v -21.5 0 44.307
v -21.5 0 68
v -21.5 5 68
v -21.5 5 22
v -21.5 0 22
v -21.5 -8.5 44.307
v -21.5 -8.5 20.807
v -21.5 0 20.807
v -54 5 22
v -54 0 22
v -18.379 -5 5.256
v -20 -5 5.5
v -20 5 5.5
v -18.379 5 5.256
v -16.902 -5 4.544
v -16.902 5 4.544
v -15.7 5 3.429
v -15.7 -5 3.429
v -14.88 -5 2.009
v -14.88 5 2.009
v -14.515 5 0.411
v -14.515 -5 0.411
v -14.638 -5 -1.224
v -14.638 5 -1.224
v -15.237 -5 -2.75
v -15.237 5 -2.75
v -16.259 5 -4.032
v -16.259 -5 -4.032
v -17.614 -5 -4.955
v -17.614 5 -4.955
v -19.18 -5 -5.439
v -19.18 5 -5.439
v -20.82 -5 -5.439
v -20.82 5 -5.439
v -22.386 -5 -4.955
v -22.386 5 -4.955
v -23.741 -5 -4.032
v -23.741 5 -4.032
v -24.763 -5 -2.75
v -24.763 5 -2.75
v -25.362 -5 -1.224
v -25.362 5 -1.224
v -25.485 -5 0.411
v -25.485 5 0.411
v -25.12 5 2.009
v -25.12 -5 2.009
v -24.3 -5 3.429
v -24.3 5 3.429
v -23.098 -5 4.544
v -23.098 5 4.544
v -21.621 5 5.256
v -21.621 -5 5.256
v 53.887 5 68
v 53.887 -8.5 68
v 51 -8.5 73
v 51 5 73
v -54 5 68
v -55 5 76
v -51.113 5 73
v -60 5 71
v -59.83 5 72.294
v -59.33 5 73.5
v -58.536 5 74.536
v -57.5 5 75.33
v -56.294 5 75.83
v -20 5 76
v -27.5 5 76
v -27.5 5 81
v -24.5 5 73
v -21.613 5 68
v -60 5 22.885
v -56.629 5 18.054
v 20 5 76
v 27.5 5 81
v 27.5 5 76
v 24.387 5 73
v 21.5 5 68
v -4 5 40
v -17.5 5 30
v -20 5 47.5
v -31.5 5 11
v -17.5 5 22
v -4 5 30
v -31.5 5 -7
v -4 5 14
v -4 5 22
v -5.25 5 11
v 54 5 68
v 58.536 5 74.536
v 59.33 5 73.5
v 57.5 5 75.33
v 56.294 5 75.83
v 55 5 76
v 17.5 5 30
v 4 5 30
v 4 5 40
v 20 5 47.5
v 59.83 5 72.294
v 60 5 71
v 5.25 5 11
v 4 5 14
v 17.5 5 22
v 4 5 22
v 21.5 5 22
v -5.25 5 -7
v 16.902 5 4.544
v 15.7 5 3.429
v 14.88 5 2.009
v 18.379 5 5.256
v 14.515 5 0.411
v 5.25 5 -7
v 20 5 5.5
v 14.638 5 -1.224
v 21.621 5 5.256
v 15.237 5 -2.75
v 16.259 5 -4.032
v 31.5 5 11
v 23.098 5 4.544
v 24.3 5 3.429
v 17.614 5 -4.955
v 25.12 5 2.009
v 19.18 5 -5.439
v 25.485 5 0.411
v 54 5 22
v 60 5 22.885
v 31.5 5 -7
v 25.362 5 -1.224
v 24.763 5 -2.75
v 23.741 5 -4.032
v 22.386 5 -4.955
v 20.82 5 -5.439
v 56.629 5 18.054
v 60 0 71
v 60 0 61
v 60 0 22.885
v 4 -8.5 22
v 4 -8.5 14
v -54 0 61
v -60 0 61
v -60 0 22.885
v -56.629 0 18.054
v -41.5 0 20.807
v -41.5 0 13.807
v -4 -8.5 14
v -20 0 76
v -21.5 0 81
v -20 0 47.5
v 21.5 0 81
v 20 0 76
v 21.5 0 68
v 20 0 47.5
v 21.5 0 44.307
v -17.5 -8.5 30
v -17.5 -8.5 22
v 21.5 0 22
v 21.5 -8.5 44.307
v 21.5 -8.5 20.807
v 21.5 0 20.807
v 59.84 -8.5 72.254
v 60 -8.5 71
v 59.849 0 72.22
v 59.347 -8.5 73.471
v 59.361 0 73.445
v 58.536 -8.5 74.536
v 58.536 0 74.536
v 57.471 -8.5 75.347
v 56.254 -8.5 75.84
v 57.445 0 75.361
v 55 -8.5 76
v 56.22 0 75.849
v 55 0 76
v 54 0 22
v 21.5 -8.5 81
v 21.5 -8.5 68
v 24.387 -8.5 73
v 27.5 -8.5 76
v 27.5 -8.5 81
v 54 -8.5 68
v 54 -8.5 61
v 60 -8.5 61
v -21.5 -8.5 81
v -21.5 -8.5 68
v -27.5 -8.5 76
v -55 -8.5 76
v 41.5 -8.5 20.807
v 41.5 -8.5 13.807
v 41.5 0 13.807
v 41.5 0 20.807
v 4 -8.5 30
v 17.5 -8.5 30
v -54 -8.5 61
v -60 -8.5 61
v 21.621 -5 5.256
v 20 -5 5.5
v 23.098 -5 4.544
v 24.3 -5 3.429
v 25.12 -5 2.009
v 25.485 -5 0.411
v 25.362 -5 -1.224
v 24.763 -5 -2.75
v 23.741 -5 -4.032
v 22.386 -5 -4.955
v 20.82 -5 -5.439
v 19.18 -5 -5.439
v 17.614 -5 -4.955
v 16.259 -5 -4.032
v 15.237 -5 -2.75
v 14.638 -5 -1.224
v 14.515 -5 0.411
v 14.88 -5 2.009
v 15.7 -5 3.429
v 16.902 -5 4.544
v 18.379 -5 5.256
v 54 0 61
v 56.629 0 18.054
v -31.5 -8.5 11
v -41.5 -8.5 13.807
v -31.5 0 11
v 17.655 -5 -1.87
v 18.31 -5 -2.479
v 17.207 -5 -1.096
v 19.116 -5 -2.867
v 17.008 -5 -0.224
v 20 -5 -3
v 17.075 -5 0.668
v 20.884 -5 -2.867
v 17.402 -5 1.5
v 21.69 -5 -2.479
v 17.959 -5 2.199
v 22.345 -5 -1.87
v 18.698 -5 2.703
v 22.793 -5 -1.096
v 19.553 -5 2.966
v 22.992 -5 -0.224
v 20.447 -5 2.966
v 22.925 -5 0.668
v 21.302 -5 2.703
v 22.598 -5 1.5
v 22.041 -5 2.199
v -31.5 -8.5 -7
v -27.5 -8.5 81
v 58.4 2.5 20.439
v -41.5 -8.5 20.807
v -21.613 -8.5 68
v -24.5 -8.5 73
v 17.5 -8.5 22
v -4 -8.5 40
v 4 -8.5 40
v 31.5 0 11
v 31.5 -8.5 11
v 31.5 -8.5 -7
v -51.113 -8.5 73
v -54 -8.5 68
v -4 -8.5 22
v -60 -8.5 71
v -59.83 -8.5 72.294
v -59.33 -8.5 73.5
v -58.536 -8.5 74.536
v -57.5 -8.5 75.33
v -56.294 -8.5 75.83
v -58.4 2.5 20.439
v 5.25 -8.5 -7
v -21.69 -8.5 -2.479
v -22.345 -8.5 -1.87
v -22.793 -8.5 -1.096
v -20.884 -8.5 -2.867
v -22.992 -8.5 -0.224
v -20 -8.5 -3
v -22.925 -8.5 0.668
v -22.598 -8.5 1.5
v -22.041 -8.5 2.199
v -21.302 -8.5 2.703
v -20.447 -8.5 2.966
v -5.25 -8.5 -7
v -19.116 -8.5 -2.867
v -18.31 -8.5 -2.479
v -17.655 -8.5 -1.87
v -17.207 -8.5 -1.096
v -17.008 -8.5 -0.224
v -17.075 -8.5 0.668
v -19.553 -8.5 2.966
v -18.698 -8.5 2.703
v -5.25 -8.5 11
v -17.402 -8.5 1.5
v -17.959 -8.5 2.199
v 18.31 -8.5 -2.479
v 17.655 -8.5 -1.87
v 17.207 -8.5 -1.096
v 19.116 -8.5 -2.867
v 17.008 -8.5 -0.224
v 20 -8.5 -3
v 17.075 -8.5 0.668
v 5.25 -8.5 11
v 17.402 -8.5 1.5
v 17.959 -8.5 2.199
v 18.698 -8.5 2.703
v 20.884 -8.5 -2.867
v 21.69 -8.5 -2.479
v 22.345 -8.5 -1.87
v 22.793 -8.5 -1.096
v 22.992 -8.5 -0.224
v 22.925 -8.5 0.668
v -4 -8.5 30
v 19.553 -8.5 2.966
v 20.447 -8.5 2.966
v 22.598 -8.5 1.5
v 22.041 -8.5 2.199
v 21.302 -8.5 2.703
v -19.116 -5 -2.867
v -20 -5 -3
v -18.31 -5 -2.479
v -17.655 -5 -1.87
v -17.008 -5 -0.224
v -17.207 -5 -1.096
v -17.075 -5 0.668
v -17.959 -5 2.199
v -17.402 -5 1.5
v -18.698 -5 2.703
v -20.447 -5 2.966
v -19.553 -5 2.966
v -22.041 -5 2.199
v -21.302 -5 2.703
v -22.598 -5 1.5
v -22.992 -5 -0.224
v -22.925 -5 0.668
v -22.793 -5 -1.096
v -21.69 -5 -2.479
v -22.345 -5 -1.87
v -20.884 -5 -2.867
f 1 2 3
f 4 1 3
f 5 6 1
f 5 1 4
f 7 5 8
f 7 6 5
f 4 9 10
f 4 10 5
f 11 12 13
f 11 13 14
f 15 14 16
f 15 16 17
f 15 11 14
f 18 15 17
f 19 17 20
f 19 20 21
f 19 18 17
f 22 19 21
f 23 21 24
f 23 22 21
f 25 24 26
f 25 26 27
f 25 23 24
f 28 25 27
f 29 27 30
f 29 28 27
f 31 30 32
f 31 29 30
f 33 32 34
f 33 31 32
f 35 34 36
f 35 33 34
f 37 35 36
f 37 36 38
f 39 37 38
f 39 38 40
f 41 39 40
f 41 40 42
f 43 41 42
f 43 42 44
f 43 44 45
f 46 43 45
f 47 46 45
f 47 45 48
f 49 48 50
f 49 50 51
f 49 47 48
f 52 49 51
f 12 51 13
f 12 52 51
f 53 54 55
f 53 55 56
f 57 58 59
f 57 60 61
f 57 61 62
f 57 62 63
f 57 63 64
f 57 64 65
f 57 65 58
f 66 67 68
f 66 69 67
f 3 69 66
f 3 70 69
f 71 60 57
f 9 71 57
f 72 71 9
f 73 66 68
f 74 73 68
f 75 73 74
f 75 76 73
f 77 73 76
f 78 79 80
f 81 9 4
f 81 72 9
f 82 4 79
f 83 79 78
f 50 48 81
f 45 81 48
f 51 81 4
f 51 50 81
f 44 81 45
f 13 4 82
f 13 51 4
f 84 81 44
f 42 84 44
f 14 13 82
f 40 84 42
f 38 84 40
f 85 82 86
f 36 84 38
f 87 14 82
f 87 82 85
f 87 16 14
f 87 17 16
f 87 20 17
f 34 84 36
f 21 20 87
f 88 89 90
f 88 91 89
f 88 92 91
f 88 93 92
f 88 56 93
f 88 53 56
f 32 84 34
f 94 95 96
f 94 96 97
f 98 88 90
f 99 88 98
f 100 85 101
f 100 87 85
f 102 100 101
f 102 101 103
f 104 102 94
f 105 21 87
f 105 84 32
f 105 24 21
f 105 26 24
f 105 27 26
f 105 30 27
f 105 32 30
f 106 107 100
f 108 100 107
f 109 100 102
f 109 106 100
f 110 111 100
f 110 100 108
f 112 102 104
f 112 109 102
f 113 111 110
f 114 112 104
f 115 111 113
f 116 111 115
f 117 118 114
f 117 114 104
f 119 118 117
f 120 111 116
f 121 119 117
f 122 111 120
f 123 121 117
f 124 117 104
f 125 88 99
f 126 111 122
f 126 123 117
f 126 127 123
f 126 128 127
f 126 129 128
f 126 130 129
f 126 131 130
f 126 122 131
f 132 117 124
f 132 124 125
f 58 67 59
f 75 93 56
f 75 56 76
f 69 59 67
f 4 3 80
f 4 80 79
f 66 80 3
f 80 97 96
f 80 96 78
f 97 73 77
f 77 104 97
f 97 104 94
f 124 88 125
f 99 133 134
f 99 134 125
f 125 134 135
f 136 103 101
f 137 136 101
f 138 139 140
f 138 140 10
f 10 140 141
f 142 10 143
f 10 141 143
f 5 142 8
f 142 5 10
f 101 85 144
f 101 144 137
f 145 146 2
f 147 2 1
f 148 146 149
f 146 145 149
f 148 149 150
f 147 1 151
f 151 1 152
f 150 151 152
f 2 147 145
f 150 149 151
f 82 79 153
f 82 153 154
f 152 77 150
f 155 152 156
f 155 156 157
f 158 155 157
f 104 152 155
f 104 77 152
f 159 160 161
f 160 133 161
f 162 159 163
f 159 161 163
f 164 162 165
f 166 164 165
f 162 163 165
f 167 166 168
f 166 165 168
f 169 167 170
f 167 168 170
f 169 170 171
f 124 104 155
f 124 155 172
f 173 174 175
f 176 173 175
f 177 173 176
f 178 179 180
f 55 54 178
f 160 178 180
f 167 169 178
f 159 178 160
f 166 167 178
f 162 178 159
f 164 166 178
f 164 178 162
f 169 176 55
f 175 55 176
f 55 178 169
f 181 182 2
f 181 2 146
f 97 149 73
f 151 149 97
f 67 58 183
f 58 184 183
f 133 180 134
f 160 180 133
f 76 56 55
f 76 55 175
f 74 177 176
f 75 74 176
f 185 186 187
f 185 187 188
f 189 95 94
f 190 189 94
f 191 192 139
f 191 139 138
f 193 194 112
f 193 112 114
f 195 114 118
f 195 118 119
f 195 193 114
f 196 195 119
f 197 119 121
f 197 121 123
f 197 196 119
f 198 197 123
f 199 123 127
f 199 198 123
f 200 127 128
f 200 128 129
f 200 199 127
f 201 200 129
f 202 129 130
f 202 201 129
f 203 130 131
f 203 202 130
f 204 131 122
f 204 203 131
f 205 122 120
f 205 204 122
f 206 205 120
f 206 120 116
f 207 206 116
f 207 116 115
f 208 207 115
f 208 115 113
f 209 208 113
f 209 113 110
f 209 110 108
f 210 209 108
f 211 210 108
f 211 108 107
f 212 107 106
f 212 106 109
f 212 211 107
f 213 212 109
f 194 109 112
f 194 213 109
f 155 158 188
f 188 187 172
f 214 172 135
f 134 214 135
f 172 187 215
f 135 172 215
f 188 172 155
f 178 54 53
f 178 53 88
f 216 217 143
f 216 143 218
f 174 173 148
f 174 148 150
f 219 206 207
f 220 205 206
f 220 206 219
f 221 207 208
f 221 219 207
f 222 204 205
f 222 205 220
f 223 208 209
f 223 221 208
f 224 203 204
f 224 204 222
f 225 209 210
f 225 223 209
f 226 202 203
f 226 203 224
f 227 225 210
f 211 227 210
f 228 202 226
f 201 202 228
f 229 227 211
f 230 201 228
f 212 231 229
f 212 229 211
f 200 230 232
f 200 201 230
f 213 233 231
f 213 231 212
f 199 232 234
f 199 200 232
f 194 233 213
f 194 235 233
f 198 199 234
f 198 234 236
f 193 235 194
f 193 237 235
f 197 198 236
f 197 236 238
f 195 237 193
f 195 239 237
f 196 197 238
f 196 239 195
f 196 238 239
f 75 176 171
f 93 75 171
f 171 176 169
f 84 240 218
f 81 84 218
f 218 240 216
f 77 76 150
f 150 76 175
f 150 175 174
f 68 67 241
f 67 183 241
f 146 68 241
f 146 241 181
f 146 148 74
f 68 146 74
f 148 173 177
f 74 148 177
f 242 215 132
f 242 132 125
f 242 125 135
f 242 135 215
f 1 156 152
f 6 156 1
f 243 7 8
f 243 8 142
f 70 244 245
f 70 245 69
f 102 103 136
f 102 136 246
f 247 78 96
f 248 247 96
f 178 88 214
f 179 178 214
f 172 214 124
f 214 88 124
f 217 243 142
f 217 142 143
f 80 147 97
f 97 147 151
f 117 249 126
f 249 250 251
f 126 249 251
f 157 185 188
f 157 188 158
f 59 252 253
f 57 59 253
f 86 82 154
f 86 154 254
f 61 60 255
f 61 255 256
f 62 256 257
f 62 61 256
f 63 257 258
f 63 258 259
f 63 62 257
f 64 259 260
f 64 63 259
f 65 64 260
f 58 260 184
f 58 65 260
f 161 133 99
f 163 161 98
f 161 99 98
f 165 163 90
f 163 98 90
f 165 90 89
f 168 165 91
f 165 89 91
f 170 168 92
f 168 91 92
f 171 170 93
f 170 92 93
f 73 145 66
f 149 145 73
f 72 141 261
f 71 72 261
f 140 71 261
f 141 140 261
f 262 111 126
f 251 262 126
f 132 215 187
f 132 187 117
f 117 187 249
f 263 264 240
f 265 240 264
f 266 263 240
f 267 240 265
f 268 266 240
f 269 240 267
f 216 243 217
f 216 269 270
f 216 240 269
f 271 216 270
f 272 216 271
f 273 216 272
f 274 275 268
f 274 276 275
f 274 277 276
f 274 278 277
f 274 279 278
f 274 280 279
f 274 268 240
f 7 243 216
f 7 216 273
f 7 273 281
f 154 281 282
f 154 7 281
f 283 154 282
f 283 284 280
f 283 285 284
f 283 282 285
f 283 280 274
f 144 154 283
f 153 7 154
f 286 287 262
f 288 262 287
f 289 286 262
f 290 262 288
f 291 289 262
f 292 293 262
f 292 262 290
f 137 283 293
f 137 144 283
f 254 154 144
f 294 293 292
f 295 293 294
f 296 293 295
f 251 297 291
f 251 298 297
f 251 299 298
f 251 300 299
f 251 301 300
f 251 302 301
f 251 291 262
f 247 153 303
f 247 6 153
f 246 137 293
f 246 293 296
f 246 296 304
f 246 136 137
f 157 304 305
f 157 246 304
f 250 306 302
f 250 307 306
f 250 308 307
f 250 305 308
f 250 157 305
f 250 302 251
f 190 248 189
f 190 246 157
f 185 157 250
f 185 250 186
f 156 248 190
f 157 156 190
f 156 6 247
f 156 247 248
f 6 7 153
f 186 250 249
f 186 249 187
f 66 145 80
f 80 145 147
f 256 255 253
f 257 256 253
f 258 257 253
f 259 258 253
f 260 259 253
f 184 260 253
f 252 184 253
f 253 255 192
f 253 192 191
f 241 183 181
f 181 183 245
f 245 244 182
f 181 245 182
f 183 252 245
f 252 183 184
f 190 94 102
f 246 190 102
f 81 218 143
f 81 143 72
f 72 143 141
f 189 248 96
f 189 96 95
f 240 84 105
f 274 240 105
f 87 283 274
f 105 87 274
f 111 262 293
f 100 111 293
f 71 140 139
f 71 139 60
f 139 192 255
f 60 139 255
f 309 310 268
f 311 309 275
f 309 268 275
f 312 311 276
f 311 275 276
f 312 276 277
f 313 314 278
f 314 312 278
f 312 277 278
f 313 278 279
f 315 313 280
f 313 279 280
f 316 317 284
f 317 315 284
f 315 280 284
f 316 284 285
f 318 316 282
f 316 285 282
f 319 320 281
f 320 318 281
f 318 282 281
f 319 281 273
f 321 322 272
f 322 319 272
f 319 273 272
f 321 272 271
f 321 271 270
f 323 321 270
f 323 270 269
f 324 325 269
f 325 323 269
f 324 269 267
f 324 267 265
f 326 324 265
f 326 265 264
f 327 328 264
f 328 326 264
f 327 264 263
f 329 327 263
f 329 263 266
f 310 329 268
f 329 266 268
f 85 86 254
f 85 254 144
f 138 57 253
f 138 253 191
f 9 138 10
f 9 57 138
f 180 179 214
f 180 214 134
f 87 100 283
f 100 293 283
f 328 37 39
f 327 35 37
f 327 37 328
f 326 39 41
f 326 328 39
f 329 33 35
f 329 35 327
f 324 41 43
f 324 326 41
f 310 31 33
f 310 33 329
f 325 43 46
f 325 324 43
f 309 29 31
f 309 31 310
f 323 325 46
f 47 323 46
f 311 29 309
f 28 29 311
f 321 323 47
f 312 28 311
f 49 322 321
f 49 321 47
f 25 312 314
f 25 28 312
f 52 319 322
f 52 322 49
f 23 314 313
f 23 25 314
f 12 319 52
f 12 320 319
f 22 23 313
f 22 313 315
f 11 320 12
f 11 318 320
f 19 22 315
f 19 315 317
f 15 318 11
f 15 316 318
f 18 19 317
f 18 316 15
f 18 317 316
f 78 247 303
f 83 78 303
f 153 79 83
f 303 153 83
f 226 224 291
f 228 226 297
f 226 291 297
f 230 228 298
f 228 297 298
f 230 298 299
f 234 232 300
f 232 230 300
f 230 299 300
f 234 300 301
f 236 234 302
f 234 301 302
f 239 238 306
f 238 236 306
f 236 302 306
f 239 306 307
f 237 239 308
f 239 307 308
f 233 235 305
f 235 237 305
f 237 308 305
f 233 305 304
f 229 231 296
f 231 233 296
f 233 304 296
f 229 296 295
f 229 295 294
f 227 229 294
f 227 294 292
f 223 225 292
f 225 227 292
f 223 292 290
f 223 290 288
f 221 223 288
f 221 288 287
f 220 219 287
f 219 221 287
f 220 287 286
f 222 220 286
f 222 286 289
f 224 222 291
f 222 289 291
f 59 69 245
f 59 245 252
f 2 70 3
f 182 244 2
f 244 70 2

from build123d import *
from OCP.BRepFilletAPI import BRepFilletAPI_MakeChamfer
from build123d.topology import SkipClean

# Parameters (mm, degrees)
SKETCH1_W           = 40
SKETCH1_H           = 28.5
SKETCH1_R           = 3
BOSS_EXTRUDE1_DEPTH = 5
SKETCH2_W           = 32.5
SKETCH2_H           = 51
CUT_EXTRUDE1_DEPTH  = 10
SKETCH3_W           = 137.62708118
SKETCH3_H           = 29.533708408
CUT_EXTRUDE2_DEPTH  = 10
BOSS_EXTRUDE2_START = 8.5
SKETCH4_R           = 3
BOSS_EXTRUDE2_DEPTH = 8.5
FILLET1_R           = 5
SKETCH5_W           = 8
SKETCH5_H           = 8
SKETCH5_W_2         = 35
SKETCH5_H_2         = 10
CUT_EXTRUDE3_DEPTH  = 13.5
BOSS_EXTRUDE6_START = -13.5
SKETCH6_W           = 3
SKETCH6_H           = 5
BOSS_EXTRUDE6_DEPTH = 13.5
CUT_EXTRUDE4_START  = -10
SKETCH7_R           = 5.5
SKETCH7_R_2         = 3
CUT_EXTRUDE4_DEPTH  = 10
CHAMFER1_SIZE       = 5
CHAMFER1_SIZE_2     = 2.886751346
CHAMFER2_SIZE       = 5.196152423
CHAMFER2_SIZE_2     = 3


# Some blends are built 0.0001 mm under size
with BuildPart() as part:
    # Sketch1 → Boss-Extrude1 (new body)
    with BuildSketch(Plane(origin=(0, 0, 0), x_dir=(1, 0, 0), z_dir=(0, 1, 0))):
        with BuildLine():
            Line((-31.5, 11), (-31.5, -11))
            Line((-31.5, -11), (-56.629054395, -18.053769655))
            add(Edge.make_bspline(
                [(-56.629054395, -18.053769655), (-58.486129852, -20.409089771), (-60, -22.885467918)],
                knots=[0.137055219, 0.137055219, 0.137055219, 0.224914017, 0.224914017, 0.224914017], degree=2))
            Line((-60, -22.885467918), (-60, -76))
            Line((-60, -76), (-27.5, -76))
            Line((-27.5, -76), (-27.5, -81))
            Line((-27.5, -81), (27.5, -81))
            Line((27.5, -81), (27.5, -76))
            Line((27.5, -76), (60, -76))
            Line((60, -76), (60, -22.885467918))
            add(Edge.make_bspline(
                [(56.629054395, -18.053769655), (58.486129852, -20.409089771), (60, -22.885467918)],
                knots=[0.137055219, 0.137055219, 0.137055219, 0.224914017, 0.224914017, 0.224914017], degree=2))
            Line((56.629054395, -18.053769655), (31.5, -11))
            Line((31.5, -11), (31.5, 11))
            Line((31.5, 11), (5.25, 11))
            Line((5.25, 11), (5.25, -11))
            Line((5.25, -11), (-5.25, -11))
            Line((-5.25, -11), (-5.25, 11))
            Line((-5.25, 11), (-31.5, 11))
        make_face()
        with Locations((0, -61.75)):
            Rectangle(SKETCH1_W, SKETCH1_H, mode=Mode.SUBTRACT)
        with Locations(Location((-20, 0, 0), (0, 0, 270))):
            Circle(SKETCH1_R, mode=Mode.SUBTRACT)
        with Locations(Location((20, 0, 0), (0, 0, 270))):
            Circle(SKETCH1_R, mode=Mode.SUBTRACT)
    extrude(amount=BOSS_EXTRUDE1_DEPTH)

    # Sketch2 → Cut-Extrude1 (cut)
    with BuildSketch(Plane(origin=(0, 5, 0), x_dir=(1, 0, 0), z_dir=(0, 1, 0))):
        with Locations((-37.75, -47.5)):
            Rectangle(SKETCH2_W, SKETCH2_H)
        with Locations((37.75, -47.5)):
            Rectangle(SKETCH2_W, SKETCH2_H)
    extrude(amount=-CUT_EXTRUDE1_DEPTH, mode=Mode.SUBTRACT)

    # Sketch3 → Cut-Extrude2 (cut)
    with BuildSketch(Plane(origin=(0, 5, 0), x_dir=(1, 0, 0), z_dir=(0, 1, 0))):
        with Locations((-0.764574483, 21.766854204)):
            Rectangle(SKETCH3_W, SKETCH3_H)
    extrude(amount=-CUT_EXTRUDE2_DEPTH, mode=Mode.SUBTRACT)

    # Sketch4 → Boss-Extrude2 (add)
    # profile 1 of 3: a face of its own
    with SkipClean():  # the faces are left unmerged after this step: merging them gives an invalid solid
        with BuildSketch(Plane.XZ.offset(BOSS_EXTRUDE2_START)):
            Polygon((-41.5, 20.807017544), (-41.5, 13.807017544), (-31.5, 11), (-31.5, -7), (-5.25, -7), (-5.25, 11), (5.25, 11), (5.25, -7), (31.5, -7), (31.5, 11), (41.5, 13.807017544), (41.5, 20.807017544), (21.5, 20.807017544), (21.5, 44.307017544), (-21.5, 44.307017544), (-21.5, 20.807017544), align=None)
            with Locations(Location((-20, 0, 0), (0, 0, 270))):
                Circle(SKETCH4_R, mode=Mode.SUBTRACT)
            with Locations(Location((20, 0, 0), (0, 0, 270))):
                Circle(SKETCH4_R, mode=Mode.SUBTRACT)
        # profile 2 of 3: a face of its own
        with BuildSketch(Plane.XZ.offset(BOSS_EXTRUDE2_START)):
            Polygon((-60, 61), (-54, 61), (-54, 73), (-21.5, 73), (-21.5, 81), (-27.5, 81), (-27.5, 76), (-60, 76), align=None)
        # profile 3 of 3: a face of its own
        with BuildSketch(Plane.XZ.offset(BOSS_EXTRUDE2_START)):
            Polygon((27.5, 81), (21.5, 81), (21.5, 73), (54, 73), (54, 61), (60, 61), (59.999999958, 73), (60, 76), (27.5, 76), align=None)
        extrude(amount=-BOSS_EXTRUDE2_DEPTH)

    # Fillet1
    fillet1_edges = [part.edges().sort_by_distance(p)[0] for p in [
        (60, -4.25, 76),
        (-60, -4.25, 76),
    ]]
    fillet(fillet1_edges, radius=FILLET1_R)

    # Sketch5 → Cut-Extrude3 (cut)
    with SkipClean():  # the faces are left unmerged after this step: merging them gives an invalid solid
        with BuildSketch(Plane(origin=(0, 5, 0), x_dir=(1, 0, 0), z_dir=(0, 1, 0))):
            with Locations((0, -18)):
                Rectangle(SKETCH5_W, SKETCH5_H)
            with Locations((0, -26)):
                Rectangle(SKETCH5_W_2, SKETCH5_H)
            with Locations((0, -35)):
                Rectangle(SKETCH5_W, SKETCH5_H_2)
        extrude(amount=-CUT_EXTRUDE3_DEPTH, mode=Mode.SUBTRACT)

    # Sketch6 → Boss-Extrude6 (add)
    with SkipClean():  # the faces are left unmerged after this step: merging them gives an invalid solid
        with BuildSketch(Plane(origin=(0, 5, 0), x_dir=(1, 0, 0), z_dir=(0, 1, 0)).offset(BOSS_EXTRUDE6_START)):
            with Locations((-52.5, -70.5)):
                Rectangle(SKETCH6_W, SKETCH6_H)
            with Locations((-23, -70.5)):
                Rectangle(SKETCH6_W, SKETCH6_H)
            Polygon((-21.5, -73), (-24.5, -73), (-27.5, -73), (-27.5, -76), (-21.5, -76), align=None)
            with Locations((23, -70.5)):
                Rectangle(SKETCH6_W, SKETCH6_H)
            Polygon((27.5, -73), (24.5, -73), (21.5, -73), (21.5, -76), (27.5, -76), align=None)
            with Locations((52.5, -70.5)):
                Rectangle(SKETCH6_W, SKETCH6_H)
        extrude(amount=BOSS_EXTRUDE6_DEPTH)

    # Sketch7 → Cut-Extrude4 (cut)
    # profile 1 of 2: a face of its own
    with BuildSketch(Plane(origin=(0, 5, 0), x_dir=(1, 0, 0), z_dir=(0, 1, 0)).offset(CUT_EXTRUDE4_START)):
        with Locations(Location((-20, 0, 0), (0, 0, 270))):
            Circle(SKETCH7_R)
        with Locations(Location((-20, 0, 0), (0, 0, 90))):
            Circle(SKETCH7_R_2, mode=Mode.SUBTRACT)
    # profile 2 of 2: a face of its own
    with BuildSketch(Plane(origin=(0, 5, 0), x_dir=(1, 0, 0), z_dir=(0, 1, 0)).offset(CUT_EXTRUDE4_START)):
        with Locations(Location((20, 0, 0), (0, 0, 270))):
            Circle(SKETCH7_R)
        with Locations(Location((20, 0, 0), (0, 0, 90))):
            Circle(SKETCH7_R_2, mode=Mode.SUBTRACT)
    extrude(amount=CUT_EXTRUDE4_DEPTH, mode=Mode.SUBTRACT)

    # Chamfer1
    chamfer1_edges_1 = [part.edges().sort_by_distance(p)[0] for p in [
        (51, -1.75, 68),
    ]]
    chamfer1_side_1 = [part.faces().sort_by_distance(p)[0] for p in [
        (51, -1.75, 68.057735027),
    ]]
    chamfer1_edges_2 = [part.edges().sort_by_distance(p)[0] for p in [
        (-24.5, -1.75, 68),
    ]]
    chamfer1_side_2 = [part.faces().sort_by_distance(p)[0] for p in [
        (-24.5, -1.75, 68.057735027),
    ]]
    chamfer1 = BRepFilletAPI_MakeChamfer(part.part.solid().wrapped)
    for e in chamfer1_edges_1:
        chamfer1.Add(CHAMFER1_SIZE - 0.0001, CHAMFER1_SIZE_2 - 0.0001, e.wrapped, chamfer1_side_1[0].wrapped)
    for e in chamfer1_edges_2:
        chamfer1.Add(CHAMFER1_SIZE - 0.0001, CHAMFER1_SIZE_2 - 0.0001, e.wrapped, chamfer1_side_2[0].wrapped)
    add(Compound.cast(chamfer1.Shape()), mode=Mode.REPLACE)  # a hair under: the kernel refuses the full size

    # Chamfer2
    # the kernel refuses this chamfer: 5.196152423, 3 mm, written as the material it takes off along each edge
    with BuildSketch(Plane(origin=(-51, -21.942891912, 68), x_dir=(0.01932676561269968, 0, 0.9998132206222079), z_dir=(0, 1, 0))) as chamfer2_piece_1_section:
        Polygon((CHAMFER2_SIZE * 0.999813220566, -CHAMFER2_SIZE * 0.0193267656116), (-CHAMFER2_SIZE_2 * 0.0193267656127, -CHAMFER2_SIZE_2 * 0.999813220622), (0, 0), align=None)
    chamfer2_piece_1 = extrude(amount=40.385783824, mode=Mode.PRIVATE)
    chamfer2_piece_1 = split(chamfer2_piece_1, bisect_by=Plane(origin=(-51.966537061, -1.75, 73), z_dir=(0, 0, -1)), keep=Keep.TOP, mode=Mode.PRIVATE)
    chamfer2_piece_1 = split(chamfer2_piece_1, bisect_by=Plane(origin=(-54, -1.75, 69.717275258), z_dir=(1, 0, 0)), keep=Keep.TOP, mode=Mode.PRIVATE)
    add(chamfer2_piece_1, mode=Mode.SUBTRACT)
    with BuildSketch(Plane(origin=(24.5, -21.942891912, 68), x_dir=(0.019326765612701, 0, 0.9998132206222079), z_dir=(0, 1, 0))) as chamfer2_piece_2_section:
        Polygon((CHAMFER2_SIZE * 0.999813220566, -CHAMFER2_SIZE * 0.0193267656116), (-CHAMFER2_SIZE_2 * 0.0193267656127, -CHAMFER2_SIZE_2 * 0.999813220622), (0, 0), align=None)
    chamfer2_piece_2 = extrude(amount=40.385783824, mode=Mode.PRIVATE)
    chamfer2_piece_2 = split(chamfer2_piece_2, bisect_by=Plane(origin=(23.533462939, -1.75, 73), z_dir=(0, 0, -1)), keep=Keep.TOP, mode=Mode.PRIVATE)
    add(chamfer2_piece_2, mode=Mode.SUBTRACT)


solid = part.part
